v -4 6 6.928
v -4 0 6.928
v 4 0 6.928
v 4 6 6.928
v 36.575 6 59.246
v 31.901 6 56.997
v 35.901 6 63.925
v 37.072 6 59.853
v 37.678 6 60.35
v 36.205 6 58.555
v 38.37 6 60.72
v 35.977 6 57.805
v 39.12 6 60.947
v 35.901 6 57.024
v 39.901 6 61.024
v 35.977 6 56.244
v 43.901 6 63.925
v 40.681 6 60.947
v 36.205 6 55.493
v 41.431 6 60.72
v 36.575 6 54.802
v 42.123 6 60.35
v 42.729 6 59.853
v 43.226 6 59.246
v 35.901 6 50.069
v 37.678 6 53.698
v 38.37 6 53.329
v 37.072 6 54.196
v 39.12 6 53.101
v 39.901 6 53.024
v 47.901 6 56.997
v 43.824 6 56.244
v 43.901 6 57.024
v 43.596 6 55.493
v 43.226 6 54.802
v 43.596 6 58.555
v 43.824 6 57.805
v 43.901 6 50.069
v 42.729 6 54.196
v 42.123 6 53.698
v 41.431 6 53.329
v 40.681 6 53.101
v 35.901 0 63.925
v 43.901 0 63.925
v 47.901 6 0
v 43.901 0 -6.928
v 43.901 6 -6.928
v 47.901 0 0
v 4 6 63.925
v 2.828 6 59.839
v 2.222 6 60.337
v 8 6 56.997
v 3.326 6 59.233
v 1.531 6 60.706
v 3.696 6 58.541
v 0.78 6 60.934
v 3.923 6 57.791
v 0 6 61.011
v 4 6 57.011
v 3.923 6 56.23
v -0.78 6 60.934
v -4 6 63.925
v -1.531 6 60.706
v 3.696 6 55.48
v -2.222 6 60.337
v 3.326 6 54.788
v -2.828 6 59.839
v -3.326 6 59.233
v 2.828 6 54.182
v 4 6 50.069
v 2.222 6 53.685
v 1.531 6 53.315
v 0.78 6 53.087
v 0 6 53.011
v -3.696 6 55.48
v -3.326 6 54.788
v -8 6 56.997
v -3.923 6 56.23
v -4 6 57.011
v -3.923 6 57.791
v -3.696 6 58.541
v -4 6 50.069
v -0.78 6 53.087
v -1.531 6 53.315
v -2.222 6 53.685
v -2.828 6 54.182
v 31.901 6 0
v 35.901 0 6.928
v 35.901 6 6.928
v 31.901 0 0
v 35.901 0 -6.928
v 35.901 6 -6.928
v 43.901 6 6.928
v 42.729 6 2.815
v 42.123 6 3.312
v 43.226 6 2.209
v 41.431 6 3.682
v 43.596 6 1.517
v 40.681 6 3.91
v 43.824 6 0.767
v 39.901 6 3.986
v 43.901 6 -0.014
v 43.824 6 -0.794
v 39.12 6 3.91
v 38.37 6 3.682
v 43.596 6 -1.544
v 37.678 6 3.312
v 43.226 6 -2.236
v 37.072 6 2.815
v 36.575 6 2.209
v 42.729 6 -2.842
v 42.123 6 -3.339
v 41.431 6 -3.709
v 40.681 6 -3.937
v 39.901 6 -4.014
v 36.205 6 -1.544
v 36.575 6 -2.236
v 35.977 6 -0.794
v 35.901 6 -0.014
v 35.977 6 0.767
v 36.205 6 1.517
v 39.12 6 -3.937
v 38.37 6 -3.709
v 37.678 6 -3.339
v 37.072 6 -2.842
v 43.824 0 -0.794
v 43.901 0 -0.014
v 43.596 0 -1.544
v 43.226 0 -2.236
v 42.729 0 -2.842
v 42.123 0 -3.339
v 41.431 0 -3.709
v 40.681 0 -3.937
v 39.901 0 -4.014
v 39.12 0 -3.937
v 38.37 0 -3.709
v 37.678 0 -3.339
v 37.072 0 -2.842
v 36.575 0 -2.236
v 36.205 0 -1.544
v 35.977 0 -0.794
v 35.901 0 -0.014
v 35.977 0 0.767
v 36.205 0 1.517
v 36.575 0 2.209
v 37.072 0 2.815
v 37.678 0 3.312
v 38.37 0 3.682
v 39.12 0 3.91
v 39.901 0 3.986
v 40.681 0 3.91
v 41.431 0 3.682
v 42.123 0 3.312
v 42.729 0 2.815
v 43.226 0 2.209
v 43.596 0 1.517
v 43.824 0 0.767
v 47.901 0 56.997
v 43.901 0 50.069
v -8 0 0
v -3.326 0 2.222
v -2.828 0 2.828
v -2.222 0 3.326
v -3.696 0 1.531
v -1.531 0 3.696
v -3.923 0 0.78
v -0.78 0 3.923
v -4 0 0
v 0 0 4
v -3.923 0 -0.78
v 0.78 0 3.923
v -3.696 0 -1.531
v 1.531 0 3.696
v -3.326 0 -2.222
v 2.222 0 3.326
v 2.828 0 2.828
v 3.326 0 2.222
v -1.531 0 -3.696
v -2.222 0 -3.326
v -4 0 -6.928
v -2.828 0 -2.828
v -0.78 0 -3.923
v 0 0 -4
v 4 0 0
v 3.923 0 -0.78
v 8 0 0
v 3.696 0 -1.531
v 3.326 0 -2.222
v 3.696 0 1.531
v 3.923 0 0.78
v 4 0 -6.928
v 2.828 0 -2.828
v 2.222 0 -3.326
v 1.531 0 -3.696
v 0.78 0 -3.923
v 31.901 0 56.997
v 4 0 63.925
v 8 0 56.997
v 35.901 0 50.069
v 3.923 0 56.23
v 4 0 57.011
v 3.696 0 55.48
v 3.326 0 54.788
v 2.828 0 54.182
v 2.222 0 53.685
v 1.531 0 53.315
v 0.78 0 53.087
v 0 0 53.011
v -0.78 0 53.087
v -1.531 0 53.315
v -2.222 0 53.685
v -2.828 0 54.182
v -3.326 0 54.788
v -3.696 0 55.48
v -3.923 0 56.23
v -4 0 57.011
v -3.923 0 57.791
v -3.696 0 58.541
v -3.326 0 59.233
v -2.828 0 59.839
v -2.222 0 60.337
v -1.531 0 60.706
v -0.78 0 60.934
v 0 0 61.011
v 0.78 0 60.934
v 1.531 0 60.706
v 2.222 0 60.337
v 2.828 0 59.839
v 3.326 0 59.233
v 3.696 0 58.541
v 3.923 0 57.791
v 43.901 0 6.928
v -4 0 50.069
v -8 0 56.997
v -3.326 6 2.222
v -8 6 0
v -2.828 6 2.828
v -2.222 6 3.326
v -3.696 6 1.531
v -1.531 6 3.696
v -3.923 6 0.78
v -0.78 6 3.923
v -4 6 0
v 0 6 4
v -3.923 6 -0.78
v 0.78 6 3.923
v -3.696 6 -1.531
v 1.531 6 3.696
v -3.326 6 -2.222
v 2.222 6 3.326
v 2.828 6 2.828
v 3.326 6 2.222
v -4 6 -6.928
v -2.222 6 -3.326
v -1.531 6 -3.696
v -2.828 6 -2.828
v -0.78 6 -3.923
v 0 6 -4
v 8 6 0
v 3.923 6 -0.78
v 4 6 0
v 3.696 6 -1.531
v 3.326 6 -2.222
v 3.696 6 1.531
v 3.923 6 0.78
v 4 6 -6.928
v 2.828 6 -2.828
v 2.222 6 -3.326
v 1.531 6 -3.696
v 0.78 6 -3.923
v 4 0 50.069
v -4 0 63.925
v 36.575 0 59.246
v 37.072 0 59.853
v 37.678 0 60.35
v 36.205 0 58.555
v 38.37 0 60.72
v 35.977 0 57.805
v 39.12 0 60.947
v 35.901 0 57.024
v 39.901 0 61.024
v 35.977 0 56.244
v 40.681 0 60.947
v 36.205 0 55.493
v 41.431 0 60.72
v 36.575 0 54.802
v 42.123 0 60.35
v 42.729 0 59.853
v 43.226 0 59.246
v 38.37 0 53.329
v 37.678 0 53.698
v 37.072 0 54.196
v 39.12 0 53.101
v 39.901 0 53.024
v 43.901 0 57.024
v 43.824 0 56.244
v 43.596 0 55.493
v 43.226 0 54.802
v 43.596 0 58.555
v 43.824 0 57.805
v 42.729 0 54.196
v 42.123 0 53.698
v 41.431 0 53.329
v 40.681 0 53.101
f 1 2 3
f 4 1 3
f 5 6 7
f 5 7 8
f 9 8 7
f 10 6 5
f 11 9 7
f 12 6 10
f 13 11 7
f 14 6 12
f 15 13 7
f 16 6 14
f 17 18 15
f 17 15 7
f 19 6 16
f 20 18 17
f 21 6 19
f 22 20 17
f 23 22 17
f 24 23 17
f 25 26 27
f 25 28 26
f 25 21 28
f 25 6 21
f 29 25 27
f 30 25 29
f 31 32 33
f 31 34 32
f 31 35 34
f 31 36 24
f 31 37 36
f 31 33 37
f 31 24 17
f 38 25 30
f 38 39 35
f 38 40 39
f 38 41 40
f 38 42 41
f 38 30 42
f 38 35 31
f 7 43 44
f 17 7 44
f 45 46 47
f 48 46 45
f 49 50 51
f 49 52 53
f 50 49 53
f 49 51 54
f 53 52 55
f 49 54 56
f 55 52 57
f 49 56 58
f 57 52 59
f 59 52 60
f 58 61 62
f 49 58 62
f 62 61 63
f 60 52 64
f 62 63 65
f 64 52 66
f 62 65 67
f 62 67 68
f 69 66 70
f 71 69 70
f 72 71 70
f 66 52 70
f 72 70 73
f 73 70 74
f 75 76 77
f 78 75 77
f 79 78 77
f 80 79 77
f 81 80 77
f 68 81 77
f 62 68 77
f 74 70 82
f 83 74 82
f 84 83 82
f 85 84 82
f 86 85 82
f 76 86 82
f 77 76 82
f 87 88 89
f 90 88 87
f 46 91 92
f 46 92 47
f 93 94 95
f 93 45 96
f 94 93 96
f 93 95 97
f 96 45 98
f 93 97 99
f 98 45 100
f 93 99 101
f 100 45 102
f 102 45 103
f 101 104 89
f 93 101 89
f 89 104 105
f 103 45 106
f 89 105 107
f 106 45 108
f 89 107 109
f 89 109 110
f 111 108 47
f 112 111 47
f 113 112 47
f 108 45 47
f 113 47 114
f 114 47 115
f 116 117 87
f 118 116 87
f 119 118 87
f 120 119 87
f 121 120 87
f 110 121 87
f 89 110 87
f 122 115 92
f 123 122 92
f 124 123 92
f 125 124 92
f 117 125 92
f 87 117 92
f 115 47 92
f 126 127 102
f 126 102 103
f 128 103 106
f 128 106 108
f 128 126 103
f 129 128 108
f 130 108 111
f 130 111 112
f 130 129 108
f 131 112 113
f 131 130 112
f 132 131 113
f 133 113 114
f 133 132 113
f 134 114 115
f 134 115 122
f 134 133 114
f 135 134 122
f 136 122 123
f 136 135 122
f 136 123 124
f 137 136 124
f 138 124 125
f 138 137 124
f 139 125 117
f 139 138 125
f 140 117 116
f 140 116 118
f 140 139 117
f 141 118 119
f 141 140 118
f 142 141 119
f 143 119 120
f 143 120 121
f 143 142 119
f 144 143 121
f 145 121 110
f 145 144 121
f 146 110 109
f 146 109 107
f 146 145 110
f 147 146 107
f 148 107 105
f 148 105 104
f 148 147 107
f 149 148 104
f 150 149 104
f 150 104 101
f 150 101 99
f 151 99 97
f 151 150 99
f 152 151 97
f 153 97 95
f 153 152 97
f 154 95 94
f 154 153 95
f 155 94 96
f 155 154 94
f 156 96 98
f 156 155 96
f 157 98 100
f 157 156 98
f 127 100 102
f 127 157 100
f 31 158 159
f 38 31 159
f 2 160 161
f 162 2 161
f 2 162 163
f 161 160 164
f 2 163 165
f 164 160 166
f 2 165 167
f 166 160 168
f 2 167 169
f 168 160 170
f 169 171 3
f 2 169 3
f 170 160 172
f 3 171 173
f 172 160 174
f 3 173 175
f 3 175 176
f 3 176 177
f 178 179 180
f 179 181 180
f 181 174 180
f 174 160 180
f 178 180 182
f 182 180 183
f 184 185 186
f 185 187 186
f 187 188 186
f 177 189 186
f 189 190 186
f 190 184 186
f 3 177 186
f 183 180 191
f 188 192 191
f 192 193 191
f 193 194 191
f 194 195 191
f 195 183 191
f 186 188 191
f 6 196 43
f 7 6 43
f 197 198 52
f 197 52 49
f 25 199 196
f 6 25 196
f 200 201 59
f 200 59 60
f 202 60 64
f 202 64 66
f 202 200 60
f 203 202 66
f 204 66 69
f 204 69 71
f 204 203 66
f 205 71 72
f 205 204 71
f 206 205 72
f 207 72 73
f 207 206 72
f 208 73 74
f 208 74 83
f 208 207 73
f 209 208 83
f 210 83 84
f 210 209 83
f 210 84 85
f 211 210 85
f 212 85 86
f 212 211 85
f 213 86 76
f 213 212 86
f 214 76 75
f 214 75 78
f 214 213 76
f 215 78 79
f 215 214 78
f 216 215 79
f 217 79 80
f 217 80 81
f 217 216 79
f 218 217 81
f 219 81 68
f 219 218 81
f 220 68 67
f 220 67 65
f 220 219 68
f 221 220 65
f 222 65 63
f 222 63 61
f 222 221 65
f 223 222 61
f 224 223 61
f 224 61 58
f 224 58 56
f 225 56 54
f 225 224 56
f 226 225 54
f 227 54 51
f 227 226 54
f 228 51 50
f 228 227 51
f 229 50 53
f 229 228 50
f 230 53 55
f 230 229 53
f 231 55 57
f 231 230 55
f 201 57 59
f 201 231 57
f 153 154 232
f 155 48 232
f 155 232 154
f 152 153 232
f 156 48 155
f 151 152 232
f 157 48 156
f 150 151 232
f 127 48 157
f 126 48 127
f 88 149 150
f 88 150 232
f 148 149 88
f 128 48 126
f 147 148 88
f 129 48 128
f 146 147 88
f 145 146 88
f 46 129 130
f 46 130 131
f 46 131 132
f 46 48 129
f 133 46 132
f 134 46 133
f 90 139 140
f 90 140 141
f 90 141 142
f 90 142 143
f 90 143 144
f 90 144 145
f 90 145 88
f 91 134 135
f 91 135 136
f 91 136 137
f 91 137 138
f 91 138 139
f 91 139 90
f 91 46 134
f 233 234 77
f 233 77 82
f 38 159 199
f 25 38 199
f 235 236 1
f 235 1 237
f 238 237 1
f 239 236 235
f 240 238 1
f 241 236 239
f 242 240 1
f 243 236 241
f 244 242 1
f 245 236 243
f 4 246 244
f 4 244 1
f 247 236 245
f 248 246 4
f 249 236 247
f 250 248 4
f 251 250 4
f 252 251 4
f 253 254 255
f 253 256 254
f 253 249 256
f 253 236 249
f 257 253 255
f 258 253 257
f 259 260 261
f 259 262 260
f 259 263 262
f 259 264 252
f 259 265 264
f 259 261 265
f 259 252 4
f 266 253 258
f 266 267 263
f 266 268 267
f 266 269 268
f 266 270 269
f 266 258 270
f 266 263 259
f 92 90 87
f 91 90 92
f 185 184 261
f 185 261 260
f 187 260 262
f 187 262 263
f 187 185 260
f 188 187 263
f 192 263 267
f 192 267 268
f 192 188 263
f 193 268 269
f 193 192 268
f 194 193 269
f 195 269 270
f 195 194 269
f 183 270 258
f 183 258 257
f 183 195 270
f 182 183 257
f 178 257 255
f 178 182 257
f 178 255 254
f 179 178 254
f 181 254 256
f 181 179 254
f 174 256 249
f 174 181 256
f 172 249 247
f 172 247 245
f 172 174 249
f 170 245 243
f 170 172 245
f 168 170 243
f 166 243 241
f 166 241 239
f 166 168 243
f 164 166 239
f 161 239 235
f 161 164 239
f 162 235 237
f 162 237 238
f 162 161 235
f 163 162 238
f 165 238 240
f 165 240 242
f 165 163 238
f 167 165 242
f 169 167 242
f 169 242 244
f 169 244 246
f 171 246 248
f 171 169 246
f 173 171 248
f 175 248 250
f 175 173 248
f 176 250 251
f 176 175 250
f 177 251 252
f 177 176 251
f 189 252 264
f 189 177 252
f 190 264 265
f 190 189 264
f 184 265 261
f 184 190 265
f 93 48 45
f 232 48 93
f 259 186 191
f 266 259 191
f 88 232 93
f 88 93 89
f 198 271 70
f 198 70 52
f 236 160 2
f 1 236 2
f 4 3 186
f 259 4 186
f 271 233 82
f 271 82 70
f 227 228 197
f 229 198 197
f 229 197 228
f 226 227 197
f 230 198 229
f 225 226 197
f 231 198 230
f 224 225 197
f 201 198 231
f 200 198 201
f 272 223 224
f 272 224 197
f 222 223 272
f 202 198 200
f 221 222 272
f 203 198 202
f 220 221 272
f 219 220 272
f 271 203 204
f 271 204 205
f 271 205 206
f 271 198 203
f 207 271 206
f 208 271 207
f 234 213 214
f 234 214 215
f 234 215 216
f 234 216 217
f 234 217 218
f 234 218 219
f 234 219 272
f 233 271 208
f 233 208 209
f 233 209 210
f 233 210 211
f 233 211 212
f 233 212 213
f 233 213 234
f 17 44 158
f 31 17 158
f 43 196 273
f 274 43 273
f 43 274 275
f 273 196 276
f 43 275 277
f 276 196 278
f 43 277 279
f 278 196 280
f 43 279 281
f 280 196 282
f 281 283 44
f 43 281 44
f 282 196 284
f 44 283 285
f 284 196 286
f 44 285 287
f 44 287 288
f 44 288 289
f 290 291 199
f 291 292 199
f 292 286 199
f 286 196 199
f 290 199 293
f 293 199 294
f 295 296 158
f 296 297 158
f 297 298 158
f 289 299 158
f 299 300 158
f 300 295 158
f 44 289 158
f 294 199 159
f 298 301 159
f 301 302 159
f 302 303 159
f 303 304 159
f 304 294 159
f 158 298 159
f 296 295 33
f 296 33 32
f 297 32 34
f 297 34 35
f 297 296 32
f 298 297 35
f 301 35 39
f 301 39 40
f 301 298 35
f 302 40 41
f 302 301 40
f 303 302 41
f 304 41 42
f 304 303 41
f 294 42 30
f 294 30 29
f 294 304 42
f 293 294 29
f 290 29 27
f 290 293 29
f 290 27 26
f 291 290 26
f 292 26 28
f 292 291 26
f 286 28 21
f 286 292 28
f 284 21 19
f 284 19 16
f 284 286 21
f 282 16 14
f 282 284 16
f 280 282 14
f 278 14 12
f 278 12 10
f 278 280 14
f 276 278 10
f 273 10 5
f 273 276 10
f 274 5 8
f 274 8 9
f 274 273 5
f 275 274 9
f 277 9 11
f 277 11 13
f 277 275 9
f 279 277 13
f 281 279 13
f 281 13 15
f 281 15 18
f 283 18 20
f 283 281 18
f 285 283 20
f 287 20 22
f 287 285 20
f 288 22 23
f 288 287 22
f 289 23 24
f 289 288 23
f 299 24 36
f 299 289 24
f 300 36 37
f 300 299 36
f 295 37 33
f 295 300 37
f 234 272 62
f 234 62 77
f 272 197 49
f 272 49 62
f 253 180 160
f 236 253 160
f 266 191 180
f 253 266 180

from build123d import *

# Parameters (mm, degrees)
SKETCH1_R             = 4
BOSS_EXTRUDE1_DEPTH   = 6
BOSS_EXTRUDE1_2_DEPTH = 6
BOSS_EXTRUDE1_3_DEPTH = 6
BOSS_EXTRUDE1_4_DEPTH = 6


with BuildPart() as part:
    # Sketch1 → Boss-Extrude1 (new body)
    with BuildSketch(Plane(origin=(0, 0, 0), x_dir=(1, 0, 0), z_dir=(0, 1, 0))):
        Polygon((-4, -6.92820323), (4, -6.92820323), (8, 0), (4, 6.92820323), (-4, 6.92820323), (-8, 0), align=None)
        Circle(SKETCH1_R, mode=Mode.SUBTRACT)
    extrude(amount=BOSS_EXTRUDE1_DEPTH)


with BuildPart() as body_2:
    # Sketch1 → Boss-Extrude1 2 (new body)
    with BuildSketch(Plane(origin=(0, 0, 0), x_dir=(1, 0, 0), z_dir=(0, 1, 0))):
        Polygon((31.900520373, 0), (35.900520373, 6.92820323), (43.900520373, 6.92820323), (47.900520373, 0), (43.900520373, -6.92820323), (35.900520373, -6.92820323), align=None)
        with Locations((39.900520373, 0.013548179)):
            Circle(SKETCH1_R, mode=Mode.SUBTRACT)
    extrude(amount=BOSS_EXTRUDE1_2_DEPTH)


with BuildPart() as body_3:
    # Sketch1 → Boss-Extrude1 3 (new body)
    with BuildSketch(Plane(origin=(0, 0, 0), x_dir=(1, 0, 0), z_dir=(0, 1, 0))):
        Polygon((8, -56.997084352), (4, -63.925287582), (-4, -63.925287582), (-8, -56.997084352), (-4, -50.068881122), (4, -50.068881122), align=None)
        with Locations((0, -57.010632531)):
            Circle(SKETCH1_R, mode=Mode.SUBTRACT)
    extrude(amount=BOSS_EXTRUDE1_3_DEPTH)


with BuildPart() as body_4:
    # Sketch1 → Boss-Extrude1 4 (new body)
    with BuildSketch(Plane(origin=(0, 0, 0), x_dir=(1, 0, 0), z_dir=(0, 1, 0))):
        Polygon((43.900520373, -50.068881122), (35.900520373, -50.068881122), (31.900520373, -56.997084352), (35.900520373, -63.925287582), (43.900520373, -63.925287582), (47.900520373, -56.997084352), align=None)
        with Locations((39.900520373, -57.02418071)):
            Circle(SKETCH1_R, mode=Mode.SUBTRACT)
    extrude(amount=BOSS_EXTRUDE1_4_DEPTH)


solid = Compound([part.part, body_2.part, body_3.part, body_4.part])
